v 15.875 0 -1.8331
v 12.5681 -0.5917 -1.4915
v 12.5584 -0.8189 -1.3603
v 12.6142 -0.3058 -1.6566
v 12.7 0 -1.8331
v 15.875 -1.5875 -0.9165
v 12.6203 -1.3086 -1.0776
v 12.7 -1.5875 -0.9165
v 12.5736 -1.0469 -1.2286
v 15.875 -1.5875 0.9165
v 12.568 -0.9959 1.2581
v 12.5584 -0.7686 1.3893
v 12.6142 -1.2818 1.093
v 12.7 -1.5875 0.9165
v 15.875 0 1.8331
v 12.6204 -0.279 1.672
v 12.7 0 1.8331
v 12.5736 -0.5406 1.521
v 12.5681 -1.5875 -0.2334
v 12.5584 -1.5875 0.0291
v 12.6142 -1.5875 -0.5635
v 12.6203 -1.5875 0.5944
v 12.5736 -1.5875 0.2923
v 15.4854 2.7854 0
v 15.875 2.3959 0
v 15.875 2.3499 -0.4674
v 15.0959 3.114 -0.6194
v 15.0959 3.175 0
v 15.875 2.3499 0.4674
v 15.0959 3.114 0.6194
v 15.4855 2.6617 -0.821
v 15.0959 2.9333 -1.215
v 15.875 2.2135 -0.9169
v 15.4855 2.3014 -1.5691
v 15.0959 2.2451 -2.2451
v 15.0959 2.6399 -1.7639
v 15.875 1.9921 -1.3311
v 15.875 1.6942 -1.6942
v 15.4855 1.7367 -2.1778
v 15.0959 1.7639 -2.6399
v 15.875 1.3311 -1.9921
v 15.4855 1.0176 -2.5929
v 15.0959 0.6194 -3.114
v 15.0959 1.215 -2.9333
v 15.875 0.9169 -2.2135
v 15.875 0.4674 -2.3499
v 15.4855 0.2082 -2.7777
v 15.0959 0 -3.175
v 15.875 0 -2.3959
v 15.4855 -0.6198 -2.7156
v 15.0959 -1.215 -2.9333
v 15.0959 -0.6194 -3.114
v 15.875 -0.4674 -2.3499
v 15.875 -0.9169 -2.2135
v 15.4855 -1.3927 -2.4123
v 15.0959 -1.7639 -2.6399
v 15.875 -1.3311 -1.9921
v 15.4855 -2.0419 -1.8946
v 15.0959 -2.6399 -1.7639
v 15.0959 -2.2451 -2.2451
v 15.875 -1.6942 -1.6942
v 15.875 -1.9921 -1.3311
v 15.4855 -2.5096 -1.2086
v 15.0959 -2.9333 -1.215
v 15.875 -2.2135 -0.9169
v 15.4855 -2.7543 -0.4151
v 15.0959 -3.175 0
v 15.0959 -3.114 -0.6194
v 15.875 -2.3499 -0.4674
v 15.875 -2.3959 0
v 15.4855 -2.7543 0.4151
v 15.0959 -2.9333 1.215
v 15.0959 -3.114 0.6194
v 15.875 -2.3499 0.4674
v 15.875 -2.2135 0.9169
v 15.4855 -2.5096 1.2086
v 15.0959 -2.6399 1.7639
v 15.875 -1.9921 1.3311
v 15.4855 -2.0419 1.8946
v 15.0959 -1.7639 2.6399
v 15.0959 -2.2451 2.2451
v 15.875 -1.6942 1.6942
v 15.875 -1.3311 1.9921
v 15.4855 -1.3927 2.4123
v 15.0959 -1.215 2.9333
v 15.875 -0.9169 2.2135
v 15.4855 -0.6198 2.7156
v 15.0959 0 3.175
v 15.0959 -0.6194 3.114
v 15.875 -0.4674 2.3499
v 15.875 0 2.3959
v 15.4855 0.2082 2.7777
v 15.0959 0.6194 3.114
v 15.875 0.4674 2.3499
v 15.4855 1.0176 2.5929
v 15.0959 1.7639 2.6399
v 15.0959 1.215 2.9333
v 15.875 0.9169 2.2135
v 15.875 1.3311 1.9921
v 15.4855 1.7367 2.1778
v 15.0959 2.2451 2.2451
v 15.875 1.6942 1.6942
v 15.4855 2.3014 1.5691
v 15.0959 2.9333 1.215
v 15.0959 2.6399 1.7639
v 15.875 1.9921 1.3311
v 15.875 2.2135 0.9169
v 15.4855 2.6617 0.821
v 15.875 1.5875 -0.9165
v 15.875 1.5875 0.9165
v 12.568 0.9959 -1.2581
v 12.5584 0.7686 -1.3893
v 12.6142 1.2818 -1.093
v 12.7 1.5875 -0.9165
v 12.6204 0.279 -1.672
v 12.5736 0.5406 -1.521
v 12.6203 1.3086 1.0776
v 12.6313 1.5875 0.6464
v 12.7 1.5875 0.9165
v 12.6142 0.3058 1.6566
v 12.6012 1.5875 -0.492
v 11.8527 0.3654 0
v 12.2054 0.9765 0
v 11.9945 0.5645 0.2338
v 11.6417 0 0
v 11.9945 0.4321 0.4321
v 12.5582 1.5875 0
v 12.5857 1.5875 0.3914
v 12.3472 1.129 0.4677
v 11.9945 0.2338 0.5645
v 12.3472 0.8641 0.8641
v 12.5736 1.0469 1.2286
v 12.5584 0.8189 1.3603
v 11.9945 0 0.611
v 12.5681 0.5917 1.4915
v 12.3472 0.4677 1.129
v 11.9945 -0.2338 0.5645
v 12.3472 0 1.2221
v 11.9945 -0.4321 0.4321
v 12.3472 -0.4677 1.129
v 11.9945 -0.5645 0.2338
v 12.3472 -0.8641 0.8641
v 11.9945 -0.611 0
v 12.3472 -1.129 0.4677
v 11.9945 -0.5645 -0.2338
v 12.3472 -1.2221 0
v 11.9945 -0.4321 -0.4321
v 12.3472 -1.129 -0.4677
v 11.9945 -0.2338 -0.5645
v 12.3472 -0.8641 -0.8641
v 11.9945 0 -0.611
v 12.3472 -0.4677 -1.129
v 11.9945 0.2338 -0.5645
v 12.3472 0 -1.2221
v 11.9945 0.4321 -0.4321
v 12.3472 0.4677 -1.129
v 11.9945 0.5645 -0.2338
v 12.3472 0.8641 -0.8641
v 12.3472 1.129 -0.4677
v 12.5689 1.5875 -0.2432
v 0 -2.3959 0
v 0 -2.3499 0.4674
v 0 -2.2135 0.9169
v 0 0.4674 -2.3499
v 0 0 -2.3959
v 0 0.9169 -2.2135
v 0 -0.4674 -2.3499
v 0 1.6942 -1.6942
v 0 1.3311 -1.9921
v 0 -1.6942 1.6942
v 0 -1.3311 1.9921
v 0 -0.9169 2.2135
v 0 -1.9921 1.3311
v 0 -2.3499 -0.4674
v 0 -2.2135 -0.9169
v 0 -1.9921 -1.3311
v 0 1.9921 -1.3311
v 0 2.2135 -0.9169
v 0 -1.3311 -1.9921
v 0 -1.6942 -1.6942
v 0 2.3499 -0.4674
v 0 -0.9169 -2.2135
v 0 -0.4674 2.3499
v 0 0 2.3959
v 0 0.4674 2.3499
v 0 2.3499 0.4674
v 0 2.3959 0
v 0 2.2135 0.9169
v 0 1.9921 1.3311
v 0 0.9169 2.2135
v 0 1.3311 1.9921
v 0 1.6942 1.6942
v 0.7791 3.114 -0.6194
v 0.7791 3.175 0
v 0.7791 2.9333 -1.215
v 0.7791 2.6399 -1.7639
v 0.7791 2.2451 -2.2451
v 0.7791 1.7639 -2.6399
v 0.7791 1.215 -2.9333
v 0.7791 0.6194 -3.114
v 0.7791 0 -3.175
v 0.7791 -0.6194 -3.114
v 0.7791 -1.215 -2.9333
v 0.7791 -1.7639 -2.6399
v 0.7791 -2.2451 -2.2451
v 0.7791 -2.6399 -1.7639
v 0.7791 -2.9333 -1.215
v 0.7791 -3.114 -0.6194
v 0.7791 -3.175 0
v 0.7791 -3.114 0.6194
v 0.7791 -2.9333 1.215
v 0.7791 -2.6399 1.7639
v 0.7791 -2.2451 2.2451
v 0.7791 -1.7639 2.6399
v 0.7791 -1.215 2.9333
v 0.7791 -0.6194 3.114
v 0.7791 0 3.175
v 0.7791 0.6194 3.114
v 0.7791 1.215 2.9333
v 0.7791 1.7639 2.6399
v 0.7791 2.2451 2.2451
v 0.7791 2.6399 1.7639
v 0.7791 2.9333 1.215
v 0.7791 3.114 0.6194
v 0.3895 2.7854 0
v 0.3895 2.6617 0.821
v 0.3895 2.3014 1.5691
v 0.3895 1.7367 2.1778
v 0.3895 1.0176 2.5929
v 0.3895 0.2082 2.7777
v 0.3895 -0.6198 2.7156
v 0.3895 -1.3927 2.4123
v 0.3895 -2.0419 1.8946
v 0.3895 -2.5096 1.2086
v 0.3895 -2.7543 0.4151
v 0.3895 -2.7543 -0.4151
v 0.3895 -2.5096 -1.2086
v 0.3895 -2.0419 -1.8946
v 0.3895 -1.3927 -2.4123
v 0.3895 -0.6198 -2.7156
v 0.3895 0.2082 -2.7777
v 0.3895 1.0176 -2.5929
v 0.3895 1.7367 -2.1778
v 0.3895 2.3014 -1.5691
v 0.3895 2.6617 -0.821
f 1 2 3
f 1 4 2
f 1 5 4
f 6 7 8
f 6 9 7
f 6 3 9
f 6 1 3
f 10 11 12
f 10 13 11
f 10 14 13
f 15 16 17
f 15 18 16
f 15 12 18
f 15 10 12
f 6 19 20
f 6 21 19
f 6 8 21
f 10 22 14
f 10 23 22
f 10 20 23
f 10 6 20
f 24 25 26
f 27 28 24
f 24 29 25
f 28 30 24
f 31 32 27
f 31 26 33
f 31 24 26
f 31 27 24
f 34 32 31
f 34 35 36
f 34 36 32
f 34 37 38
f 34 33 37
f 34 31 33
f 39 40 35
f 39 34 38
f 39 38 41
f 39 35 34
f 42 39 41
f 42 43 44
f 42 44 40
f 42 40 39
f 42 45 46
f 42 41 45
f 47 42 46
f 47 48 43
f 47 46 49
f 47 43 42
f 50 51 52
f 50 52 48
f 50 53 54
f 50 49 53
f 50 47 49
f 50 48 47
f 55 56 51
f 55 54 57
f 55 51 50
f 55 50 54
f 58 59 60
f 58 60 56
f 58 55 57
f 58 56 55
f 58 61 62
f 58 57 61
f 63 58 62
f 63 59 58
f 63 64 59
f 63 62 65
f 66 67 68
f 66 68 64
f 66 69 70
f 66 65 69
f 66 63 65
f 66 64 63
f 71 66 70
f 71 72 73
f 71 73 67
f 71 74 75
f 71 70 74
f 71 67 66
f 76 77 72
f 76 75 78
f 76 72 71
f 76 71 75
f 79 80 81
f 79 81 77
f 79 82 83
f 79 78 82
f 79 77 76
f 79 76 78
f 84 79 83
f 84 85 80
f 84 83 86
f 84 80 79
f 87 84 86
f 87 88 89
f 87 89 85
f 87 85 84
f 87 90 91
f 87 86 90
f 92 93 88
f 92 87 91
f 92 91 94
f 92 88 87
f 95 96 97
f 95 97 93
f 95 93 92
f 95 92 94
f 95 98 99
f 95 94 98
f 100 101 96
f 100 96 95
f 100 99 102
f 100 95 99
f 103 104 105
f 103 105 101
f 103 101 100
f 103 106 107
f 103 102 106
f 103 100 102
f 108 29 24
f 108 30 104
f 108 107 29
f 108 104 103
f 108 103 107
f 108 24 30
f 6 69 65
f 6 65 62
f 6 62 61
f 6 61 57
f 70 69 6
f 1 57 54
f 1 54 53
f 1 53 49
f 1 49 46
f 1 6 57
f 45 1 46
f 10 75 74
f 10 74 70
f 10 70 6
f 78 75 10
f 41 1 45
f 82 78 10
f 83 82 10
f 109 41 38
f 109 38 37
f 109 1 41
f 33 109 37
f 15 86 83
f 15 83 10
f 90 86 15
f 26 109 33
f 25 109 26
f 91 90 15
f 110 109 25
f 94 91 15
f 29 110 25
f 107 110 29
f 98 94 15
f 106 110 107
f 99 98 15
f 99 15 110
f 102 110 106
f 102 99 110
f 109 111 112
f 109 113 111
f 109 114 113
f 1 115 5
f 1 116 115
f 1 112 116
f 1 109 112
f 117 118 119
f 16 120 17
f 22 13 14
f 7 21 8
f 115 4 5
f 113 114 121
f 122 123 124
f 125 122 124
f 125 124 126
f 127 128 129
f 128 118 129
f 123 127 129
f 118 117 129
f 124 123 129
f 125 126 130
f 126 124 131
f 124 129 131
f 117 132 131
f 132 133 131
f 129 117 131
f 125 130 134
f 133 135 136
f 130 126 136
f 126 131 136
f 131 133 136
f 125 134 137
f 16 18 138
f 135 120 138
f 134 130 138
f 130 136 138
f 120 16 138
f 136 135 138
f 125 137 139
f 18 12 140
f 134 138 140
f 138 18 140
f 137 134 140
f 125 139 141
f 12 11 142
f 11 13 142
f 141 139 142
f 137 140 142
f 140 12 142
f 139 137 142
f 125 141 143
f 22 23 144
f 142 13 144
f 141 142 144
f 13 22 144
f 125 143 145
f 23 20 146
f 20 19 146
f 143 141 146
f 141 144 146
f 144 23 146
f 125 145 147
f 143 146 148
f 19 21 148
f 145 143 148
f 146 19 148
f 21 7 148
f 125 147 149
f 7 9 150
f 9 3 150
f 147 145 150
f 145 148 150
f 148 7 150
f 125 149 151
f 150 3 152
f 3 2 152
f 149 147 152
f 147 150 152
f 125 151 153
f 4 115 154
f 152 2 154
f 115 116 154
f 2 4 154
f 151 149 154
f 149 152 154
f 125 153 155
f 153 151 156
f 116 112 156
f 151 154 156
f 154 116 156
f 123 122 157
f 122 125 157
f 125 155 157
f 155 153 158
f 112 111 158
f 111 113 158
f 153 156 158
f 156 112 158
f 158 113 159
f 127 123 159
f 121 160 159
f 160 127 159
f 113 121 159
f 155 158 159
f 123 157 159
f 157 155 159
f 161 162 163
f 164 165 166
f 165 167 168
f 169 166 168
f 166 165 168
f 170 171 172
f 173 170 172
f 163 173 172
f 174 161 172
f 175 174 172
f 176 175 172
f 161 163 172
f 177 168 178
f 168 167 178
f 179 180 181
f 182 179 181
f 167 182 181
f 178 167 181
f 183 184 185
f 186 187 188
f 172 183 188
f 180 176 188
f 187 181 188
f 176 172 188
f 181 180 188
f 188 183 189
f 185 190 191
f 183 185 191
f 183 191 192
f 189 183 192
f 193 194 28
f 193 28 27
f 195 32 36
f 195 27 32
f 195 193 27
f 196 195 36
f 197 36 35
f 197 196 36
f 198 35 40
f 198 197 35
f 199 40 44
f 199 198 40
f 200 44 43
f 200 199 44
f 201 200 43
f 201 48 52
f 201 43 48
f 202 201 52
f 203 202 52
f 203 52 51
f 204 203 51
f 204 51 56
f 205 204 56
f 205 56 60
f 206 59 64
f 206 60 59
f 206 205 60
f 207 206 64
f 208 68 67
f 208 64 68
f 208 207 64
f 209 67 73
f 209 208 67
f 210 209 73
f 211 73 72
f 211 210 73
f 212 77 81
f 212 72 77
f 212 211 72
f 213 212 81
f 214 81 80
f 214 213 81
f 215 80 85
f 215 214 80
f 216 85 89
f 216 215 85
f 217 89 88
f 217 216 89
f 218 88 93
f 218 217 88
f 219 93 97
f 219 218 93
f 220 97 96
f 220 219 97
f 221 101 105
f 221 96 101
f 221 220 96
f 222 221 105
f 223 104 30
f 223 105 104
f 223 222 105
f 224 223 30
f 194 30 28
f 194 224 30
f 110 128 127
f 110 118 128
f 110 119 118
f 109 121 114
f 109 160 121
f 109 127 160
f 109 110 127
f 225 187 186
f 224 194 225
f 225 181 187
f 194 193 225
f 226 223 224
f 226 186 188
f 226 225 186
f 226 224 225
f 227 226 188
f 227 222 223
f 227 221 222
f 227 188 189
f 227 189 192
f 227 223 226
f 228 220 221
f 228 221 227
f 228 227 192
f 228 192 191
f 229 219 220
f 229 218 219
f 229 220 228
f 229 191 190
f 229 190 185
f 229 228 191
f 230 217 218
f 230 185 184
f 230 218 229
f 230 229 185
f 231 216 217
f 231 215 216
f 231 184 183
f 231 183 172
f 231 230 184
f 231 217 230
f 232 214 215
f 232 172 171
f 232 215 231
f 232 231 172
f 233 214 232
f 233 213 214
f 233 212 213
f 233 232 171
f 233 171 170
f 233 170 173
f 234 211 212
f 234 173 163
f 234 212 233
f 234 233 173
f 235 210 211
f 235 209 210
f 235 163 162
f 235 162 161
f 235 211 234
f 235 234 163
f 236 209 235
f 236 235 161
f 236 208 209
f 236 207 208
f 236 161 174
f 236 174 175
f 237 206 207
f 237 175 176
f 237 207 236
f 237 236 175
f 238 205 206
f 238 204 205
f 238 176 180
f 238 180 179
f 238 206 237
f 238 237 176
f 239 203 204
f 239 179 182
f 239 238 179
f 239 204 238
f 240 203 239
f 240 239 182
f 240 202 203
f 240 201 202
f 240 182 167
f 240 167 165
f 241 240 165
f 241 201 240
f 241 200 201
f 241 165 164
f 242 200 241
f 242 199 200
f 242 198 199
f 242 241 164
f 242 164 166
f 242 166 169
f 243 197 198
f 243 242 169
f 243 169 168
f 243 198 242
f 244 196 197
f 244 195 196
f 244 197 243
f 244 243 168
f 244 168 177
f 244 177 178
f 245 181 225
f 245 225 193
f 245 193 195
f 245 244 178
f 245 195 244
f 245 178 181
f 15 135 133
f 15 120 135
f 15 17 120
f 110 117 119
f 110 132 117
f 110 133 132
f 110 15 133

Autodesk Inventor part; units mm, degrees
ref_plane "YZ Plane" through (0, 0, 0) normal (1, 0, 0) x (0, 1, 0)
ref_plane "XZ Plane" through (0, 0, 0) normal (0, 1, 0) x (-1, 0, 0)
sketch "Sketch1" plane through (0, 0, 0) normal (0, 0, 1) x (1, 0, 0)
  line L0 (0, 0) -> (11.6417, 0)
  line L1 (15.875, 1.8331) -> (15.875, 3.175)
  line L2 (15.875, 3.175) -> (0, 3.175)
  line L3 (15.875, 1.8331) -> (12.7, 1.8331)
  line L4 (12.7, 1.8331) -> (11.6417, 0)
  line L5 (0, -0.635) -> (0, 3.81) projected
  line L6 (0, 3.175) -> (0, 0)
  dimension "d0" = 3.175
  dimension "d1" = 60
  dimension "d2" = 6.35
  dimension "d3" = 3.6662
  dimension "d5" = 15.875
revolve "Body" add sketch "Sketch1" angle 360 about axis through (0, 0, 0) along (1, 0, 0)
chamfer "Chamfer1" distance 0.7791 angle 45 1 edges at (15.875, -3.175, 0) measured on face at (15.875, 2.6792, -0.3995)
sketch "Sketch2" plane through (15.875, 0, 0) normal (1, 0, 0) x (0, 0, -1)
  circle A0 centre (0, 0) radius 1.8331 projected
  line L0 (-0.9165, 1.5875) -> (0.9165, 1.5875)
  line L1 (0.9165, 1.5875) -> (1.8331, 0)
  line L2 (1.8331, 0) -> (0.9165, -1.5875)
  line L3 (0.9165, -1.5875) -> (-0.9165, -1.5875)
  line L4 (-0.9165, -1.5875) -> (-1.8331, 0)
  line L5 (-1.8331, 0) -> (-0.9165, 1.5875)
  point P0 (0, 0)
  point P1 (0, 0)
extrude "Slot" add sketch "Sketch2" against normal up to next contours L1 A0 | A0 L2 | L0 A0 | A0 L3 | L5 A0 | A0 L4
thread "Thread" size "1/4-20 UNC" class "2A" standard "ANSI Unified Screw Threads" length 15.875
chamfer "Chamfer2" distance 0.7791 angle 45 1 edges at (0, -3.175, 0) measured on face at (5.032, 3.1647, -0.2555)
ref_plane "Work Plane1" through (7.9375, 0, 0) normal (0, 0.5, 0.866) x (1, 0, 0)
equation "\"d7\" = -0.5 * GD1 + 0.5 * NND"
equation "\"d8\" = FAWI"
equation "\"d29\" = -0.5 * GD1 + 0.5 * NND"
equation "\"d11\" = NLG"
equation "\"d13\" = -0.5 * GD1 + 0.5 * NND"
equation "\"d14\" = FAWI"
equation "\"d30\" = -0.5 * GD1 + 0.5 * NND"
equation "\"d0\" = INTI"
equation "\"d2\" = NND"
equation "\"d3\" = 1.1547 * SW"
equation "\"d5\" = NLG"
equation "\"NND\" = 6.35"
equation "\"NLG\" = 15.875"
equation "\"INTI\" = 3.175"
equation "\"FAWI\" = 45deg"
equation "\"SW\" = 3.175"
equation "\"GD1\" = 4.79189"
equation "\"FAWI1\" = 45deg"
equation "\"SPD\" = 3.3528"
equation "\"SEWI\" = 90deg"
equation "\"TOA\" = 30deg"
equation "\"ZLG\" = 1.7018"
equation "\"ZD\" = 3.9624"
equation "\"HHPTC\" = 1.27"
equation "\"THREADDIA\" = 6.35"
equation "\"OPR\" = 4.7752"
equation "\"E0\" = 1.155 * SW"
properties part number "ANSI B18.3 - 1/4-20 UNC x 0.625" material "Steel, Mild"
